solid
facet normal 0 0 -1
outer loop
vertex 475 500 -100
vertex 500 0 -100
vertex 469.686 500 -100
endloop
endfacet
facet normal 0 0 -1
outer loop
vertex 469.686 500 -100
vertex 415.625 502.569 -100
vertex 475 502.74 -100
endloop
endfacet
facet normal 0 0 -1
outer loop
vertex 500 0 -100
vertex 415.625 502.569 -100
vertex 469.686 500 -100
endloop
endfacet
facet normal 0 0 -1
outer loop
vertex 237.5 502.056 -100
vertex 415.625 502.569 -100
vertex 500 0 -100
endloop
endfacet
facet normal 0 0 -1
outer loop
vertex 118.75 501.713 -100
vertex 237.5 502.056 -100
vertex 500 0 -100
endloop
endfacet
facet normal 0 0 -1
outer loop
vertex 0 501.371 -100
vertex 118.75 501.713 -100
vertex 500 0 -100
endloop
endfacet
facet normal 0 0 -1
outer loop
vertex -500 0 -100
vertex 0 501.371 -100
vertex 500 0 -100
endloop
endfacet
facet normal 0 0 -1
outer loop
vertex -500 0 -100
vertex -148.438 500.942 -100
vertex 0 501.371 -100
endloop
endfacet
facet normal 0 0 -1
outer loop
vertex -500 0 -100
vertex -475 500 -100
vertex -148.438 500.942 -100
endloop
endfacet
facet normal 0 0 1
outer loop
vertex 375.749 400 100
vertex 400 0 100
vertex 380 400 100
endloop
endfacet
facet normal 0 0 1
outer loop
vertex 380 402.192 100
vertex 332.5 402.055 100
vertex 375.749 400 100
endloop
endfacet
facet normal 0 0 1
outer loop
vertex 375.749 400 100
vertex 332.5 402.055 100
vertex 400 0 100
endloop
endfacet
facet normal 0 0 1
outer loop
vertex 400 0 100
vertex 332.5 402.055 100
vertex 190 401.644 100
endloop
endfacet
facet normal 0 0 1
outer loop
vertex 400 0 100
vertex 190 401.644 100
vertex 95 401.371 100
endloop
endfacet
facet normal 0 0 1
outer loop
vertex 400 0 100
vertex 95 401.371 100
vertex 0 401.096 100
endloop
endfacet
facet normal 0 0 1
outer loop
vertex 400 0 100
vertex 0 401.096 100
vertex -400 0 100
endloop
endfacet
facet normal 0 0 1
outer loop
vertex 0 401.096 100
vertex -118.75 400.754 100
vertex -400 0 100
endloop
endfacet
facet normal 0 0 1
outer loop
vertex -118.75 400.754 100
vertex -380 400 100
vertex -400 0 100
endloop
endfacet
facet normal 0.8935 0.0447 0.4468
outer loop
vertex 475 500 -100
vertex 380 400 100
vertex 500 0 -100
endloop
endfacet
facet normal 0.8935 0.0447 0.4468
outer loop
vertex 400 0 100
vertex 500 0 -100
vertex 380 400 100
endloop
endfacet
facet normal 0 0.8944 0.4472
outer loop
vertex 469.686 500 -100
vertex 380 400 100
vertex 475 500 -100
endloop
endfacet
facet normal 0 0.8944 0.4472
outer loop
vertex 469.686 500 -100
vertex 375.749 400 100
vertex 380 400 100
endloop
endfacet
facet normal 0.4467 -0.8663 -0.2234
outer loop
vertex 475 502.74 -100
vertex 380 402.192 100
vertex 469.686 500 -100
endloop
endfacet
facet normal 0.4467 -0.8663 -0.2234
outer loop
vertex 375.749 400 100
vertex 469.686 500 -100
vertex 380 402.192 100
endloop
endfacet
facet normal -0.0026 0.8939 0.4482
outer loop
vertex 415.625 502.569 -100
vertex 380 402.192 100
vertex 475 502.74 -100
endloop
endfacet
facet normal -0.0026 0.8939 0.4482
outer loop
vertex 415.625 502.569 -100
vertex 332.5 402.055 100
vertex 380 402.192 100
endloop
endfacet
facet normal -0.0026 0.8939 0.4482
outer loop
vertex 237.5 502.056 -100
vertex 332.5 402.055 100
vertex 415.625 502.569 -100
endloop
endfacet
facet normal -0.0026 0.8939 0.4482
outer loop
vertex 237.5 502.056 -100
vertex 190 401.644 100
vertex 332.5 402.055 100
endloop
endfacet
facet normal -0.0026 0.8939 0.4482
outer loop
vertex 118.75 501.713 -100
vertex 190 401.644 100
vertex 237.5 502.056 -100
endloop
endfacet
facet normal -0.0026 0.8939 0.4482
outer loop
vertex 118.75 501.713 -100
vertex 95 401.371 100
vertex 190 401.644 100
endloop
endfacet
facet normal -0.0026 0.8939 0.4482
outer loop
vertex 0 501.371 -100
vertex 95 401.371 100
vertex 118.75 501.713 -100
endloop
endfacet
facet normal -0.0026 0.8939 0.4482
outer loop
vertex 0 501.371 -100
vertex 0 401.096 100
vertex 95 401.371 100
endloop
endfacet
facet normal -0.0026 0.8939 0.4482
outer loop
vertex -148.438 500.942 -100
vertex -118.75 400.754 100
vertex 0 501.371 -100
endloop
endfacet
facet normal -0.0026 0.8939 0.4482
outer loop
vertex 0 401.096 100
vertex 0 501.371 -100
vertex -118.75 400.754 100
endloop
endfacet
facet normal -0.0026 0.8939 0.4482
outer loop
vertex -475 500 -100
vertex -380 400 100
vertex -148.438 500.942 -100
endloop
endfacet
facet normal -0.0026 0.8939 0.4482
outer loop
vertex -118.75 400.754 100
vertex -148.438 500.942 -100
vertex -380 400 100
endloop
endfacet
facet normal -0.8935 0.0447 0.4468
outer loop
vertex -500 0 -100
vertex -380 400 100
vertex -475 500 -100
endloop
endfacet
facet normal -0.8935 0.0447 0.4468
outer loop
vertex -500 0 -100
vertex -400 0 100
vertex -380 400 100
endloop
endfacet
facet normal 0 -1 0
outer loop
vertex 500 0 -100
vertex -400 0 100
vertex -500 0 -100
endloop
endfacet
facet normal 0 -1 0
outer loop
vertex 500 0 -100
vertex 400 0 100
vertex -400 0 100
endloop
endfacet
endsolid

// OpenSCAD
// Parameters
width_bottom = 1000;
width_top    = 950;
height       = 500;
top_curve_r  = 50;    // how “deep” the top curve is
segments     = 32;    // number of points for the curve

// Create points for the top curved edge
function top_curve_points(left, right, y, r, n) =
    [ for (i = [0:n]) let(t = i/n)
        [ left + t*(right-left), y + r*(sin(t*180 * PI/180)) ] ];

// Module for trapezoid with curved top
module trapezoid_top_curved() {
    bottom_left  = [-width_bottom/2, 0];
    bottom_right = [ width_bottom/2, 0];
    top_left     = [-width_top/2, height];
    top_right    = [ width_top/2, height];

    points = concat(
        [bottom_left, bottom_right],                        // bottom edge
        top_curve_points(top_left[0], top_right[0], top_left[1], top_curve_r, segments)  // top edge
    );

    polygon(points);
    polygon(points=[bottom_left, bottom_right, top_right, top_left]);
}

// Extrude to 3D
linear_extrude(height=200, center = true, convexity = 10, scale= .8)
    trapezoid_top_curved();
